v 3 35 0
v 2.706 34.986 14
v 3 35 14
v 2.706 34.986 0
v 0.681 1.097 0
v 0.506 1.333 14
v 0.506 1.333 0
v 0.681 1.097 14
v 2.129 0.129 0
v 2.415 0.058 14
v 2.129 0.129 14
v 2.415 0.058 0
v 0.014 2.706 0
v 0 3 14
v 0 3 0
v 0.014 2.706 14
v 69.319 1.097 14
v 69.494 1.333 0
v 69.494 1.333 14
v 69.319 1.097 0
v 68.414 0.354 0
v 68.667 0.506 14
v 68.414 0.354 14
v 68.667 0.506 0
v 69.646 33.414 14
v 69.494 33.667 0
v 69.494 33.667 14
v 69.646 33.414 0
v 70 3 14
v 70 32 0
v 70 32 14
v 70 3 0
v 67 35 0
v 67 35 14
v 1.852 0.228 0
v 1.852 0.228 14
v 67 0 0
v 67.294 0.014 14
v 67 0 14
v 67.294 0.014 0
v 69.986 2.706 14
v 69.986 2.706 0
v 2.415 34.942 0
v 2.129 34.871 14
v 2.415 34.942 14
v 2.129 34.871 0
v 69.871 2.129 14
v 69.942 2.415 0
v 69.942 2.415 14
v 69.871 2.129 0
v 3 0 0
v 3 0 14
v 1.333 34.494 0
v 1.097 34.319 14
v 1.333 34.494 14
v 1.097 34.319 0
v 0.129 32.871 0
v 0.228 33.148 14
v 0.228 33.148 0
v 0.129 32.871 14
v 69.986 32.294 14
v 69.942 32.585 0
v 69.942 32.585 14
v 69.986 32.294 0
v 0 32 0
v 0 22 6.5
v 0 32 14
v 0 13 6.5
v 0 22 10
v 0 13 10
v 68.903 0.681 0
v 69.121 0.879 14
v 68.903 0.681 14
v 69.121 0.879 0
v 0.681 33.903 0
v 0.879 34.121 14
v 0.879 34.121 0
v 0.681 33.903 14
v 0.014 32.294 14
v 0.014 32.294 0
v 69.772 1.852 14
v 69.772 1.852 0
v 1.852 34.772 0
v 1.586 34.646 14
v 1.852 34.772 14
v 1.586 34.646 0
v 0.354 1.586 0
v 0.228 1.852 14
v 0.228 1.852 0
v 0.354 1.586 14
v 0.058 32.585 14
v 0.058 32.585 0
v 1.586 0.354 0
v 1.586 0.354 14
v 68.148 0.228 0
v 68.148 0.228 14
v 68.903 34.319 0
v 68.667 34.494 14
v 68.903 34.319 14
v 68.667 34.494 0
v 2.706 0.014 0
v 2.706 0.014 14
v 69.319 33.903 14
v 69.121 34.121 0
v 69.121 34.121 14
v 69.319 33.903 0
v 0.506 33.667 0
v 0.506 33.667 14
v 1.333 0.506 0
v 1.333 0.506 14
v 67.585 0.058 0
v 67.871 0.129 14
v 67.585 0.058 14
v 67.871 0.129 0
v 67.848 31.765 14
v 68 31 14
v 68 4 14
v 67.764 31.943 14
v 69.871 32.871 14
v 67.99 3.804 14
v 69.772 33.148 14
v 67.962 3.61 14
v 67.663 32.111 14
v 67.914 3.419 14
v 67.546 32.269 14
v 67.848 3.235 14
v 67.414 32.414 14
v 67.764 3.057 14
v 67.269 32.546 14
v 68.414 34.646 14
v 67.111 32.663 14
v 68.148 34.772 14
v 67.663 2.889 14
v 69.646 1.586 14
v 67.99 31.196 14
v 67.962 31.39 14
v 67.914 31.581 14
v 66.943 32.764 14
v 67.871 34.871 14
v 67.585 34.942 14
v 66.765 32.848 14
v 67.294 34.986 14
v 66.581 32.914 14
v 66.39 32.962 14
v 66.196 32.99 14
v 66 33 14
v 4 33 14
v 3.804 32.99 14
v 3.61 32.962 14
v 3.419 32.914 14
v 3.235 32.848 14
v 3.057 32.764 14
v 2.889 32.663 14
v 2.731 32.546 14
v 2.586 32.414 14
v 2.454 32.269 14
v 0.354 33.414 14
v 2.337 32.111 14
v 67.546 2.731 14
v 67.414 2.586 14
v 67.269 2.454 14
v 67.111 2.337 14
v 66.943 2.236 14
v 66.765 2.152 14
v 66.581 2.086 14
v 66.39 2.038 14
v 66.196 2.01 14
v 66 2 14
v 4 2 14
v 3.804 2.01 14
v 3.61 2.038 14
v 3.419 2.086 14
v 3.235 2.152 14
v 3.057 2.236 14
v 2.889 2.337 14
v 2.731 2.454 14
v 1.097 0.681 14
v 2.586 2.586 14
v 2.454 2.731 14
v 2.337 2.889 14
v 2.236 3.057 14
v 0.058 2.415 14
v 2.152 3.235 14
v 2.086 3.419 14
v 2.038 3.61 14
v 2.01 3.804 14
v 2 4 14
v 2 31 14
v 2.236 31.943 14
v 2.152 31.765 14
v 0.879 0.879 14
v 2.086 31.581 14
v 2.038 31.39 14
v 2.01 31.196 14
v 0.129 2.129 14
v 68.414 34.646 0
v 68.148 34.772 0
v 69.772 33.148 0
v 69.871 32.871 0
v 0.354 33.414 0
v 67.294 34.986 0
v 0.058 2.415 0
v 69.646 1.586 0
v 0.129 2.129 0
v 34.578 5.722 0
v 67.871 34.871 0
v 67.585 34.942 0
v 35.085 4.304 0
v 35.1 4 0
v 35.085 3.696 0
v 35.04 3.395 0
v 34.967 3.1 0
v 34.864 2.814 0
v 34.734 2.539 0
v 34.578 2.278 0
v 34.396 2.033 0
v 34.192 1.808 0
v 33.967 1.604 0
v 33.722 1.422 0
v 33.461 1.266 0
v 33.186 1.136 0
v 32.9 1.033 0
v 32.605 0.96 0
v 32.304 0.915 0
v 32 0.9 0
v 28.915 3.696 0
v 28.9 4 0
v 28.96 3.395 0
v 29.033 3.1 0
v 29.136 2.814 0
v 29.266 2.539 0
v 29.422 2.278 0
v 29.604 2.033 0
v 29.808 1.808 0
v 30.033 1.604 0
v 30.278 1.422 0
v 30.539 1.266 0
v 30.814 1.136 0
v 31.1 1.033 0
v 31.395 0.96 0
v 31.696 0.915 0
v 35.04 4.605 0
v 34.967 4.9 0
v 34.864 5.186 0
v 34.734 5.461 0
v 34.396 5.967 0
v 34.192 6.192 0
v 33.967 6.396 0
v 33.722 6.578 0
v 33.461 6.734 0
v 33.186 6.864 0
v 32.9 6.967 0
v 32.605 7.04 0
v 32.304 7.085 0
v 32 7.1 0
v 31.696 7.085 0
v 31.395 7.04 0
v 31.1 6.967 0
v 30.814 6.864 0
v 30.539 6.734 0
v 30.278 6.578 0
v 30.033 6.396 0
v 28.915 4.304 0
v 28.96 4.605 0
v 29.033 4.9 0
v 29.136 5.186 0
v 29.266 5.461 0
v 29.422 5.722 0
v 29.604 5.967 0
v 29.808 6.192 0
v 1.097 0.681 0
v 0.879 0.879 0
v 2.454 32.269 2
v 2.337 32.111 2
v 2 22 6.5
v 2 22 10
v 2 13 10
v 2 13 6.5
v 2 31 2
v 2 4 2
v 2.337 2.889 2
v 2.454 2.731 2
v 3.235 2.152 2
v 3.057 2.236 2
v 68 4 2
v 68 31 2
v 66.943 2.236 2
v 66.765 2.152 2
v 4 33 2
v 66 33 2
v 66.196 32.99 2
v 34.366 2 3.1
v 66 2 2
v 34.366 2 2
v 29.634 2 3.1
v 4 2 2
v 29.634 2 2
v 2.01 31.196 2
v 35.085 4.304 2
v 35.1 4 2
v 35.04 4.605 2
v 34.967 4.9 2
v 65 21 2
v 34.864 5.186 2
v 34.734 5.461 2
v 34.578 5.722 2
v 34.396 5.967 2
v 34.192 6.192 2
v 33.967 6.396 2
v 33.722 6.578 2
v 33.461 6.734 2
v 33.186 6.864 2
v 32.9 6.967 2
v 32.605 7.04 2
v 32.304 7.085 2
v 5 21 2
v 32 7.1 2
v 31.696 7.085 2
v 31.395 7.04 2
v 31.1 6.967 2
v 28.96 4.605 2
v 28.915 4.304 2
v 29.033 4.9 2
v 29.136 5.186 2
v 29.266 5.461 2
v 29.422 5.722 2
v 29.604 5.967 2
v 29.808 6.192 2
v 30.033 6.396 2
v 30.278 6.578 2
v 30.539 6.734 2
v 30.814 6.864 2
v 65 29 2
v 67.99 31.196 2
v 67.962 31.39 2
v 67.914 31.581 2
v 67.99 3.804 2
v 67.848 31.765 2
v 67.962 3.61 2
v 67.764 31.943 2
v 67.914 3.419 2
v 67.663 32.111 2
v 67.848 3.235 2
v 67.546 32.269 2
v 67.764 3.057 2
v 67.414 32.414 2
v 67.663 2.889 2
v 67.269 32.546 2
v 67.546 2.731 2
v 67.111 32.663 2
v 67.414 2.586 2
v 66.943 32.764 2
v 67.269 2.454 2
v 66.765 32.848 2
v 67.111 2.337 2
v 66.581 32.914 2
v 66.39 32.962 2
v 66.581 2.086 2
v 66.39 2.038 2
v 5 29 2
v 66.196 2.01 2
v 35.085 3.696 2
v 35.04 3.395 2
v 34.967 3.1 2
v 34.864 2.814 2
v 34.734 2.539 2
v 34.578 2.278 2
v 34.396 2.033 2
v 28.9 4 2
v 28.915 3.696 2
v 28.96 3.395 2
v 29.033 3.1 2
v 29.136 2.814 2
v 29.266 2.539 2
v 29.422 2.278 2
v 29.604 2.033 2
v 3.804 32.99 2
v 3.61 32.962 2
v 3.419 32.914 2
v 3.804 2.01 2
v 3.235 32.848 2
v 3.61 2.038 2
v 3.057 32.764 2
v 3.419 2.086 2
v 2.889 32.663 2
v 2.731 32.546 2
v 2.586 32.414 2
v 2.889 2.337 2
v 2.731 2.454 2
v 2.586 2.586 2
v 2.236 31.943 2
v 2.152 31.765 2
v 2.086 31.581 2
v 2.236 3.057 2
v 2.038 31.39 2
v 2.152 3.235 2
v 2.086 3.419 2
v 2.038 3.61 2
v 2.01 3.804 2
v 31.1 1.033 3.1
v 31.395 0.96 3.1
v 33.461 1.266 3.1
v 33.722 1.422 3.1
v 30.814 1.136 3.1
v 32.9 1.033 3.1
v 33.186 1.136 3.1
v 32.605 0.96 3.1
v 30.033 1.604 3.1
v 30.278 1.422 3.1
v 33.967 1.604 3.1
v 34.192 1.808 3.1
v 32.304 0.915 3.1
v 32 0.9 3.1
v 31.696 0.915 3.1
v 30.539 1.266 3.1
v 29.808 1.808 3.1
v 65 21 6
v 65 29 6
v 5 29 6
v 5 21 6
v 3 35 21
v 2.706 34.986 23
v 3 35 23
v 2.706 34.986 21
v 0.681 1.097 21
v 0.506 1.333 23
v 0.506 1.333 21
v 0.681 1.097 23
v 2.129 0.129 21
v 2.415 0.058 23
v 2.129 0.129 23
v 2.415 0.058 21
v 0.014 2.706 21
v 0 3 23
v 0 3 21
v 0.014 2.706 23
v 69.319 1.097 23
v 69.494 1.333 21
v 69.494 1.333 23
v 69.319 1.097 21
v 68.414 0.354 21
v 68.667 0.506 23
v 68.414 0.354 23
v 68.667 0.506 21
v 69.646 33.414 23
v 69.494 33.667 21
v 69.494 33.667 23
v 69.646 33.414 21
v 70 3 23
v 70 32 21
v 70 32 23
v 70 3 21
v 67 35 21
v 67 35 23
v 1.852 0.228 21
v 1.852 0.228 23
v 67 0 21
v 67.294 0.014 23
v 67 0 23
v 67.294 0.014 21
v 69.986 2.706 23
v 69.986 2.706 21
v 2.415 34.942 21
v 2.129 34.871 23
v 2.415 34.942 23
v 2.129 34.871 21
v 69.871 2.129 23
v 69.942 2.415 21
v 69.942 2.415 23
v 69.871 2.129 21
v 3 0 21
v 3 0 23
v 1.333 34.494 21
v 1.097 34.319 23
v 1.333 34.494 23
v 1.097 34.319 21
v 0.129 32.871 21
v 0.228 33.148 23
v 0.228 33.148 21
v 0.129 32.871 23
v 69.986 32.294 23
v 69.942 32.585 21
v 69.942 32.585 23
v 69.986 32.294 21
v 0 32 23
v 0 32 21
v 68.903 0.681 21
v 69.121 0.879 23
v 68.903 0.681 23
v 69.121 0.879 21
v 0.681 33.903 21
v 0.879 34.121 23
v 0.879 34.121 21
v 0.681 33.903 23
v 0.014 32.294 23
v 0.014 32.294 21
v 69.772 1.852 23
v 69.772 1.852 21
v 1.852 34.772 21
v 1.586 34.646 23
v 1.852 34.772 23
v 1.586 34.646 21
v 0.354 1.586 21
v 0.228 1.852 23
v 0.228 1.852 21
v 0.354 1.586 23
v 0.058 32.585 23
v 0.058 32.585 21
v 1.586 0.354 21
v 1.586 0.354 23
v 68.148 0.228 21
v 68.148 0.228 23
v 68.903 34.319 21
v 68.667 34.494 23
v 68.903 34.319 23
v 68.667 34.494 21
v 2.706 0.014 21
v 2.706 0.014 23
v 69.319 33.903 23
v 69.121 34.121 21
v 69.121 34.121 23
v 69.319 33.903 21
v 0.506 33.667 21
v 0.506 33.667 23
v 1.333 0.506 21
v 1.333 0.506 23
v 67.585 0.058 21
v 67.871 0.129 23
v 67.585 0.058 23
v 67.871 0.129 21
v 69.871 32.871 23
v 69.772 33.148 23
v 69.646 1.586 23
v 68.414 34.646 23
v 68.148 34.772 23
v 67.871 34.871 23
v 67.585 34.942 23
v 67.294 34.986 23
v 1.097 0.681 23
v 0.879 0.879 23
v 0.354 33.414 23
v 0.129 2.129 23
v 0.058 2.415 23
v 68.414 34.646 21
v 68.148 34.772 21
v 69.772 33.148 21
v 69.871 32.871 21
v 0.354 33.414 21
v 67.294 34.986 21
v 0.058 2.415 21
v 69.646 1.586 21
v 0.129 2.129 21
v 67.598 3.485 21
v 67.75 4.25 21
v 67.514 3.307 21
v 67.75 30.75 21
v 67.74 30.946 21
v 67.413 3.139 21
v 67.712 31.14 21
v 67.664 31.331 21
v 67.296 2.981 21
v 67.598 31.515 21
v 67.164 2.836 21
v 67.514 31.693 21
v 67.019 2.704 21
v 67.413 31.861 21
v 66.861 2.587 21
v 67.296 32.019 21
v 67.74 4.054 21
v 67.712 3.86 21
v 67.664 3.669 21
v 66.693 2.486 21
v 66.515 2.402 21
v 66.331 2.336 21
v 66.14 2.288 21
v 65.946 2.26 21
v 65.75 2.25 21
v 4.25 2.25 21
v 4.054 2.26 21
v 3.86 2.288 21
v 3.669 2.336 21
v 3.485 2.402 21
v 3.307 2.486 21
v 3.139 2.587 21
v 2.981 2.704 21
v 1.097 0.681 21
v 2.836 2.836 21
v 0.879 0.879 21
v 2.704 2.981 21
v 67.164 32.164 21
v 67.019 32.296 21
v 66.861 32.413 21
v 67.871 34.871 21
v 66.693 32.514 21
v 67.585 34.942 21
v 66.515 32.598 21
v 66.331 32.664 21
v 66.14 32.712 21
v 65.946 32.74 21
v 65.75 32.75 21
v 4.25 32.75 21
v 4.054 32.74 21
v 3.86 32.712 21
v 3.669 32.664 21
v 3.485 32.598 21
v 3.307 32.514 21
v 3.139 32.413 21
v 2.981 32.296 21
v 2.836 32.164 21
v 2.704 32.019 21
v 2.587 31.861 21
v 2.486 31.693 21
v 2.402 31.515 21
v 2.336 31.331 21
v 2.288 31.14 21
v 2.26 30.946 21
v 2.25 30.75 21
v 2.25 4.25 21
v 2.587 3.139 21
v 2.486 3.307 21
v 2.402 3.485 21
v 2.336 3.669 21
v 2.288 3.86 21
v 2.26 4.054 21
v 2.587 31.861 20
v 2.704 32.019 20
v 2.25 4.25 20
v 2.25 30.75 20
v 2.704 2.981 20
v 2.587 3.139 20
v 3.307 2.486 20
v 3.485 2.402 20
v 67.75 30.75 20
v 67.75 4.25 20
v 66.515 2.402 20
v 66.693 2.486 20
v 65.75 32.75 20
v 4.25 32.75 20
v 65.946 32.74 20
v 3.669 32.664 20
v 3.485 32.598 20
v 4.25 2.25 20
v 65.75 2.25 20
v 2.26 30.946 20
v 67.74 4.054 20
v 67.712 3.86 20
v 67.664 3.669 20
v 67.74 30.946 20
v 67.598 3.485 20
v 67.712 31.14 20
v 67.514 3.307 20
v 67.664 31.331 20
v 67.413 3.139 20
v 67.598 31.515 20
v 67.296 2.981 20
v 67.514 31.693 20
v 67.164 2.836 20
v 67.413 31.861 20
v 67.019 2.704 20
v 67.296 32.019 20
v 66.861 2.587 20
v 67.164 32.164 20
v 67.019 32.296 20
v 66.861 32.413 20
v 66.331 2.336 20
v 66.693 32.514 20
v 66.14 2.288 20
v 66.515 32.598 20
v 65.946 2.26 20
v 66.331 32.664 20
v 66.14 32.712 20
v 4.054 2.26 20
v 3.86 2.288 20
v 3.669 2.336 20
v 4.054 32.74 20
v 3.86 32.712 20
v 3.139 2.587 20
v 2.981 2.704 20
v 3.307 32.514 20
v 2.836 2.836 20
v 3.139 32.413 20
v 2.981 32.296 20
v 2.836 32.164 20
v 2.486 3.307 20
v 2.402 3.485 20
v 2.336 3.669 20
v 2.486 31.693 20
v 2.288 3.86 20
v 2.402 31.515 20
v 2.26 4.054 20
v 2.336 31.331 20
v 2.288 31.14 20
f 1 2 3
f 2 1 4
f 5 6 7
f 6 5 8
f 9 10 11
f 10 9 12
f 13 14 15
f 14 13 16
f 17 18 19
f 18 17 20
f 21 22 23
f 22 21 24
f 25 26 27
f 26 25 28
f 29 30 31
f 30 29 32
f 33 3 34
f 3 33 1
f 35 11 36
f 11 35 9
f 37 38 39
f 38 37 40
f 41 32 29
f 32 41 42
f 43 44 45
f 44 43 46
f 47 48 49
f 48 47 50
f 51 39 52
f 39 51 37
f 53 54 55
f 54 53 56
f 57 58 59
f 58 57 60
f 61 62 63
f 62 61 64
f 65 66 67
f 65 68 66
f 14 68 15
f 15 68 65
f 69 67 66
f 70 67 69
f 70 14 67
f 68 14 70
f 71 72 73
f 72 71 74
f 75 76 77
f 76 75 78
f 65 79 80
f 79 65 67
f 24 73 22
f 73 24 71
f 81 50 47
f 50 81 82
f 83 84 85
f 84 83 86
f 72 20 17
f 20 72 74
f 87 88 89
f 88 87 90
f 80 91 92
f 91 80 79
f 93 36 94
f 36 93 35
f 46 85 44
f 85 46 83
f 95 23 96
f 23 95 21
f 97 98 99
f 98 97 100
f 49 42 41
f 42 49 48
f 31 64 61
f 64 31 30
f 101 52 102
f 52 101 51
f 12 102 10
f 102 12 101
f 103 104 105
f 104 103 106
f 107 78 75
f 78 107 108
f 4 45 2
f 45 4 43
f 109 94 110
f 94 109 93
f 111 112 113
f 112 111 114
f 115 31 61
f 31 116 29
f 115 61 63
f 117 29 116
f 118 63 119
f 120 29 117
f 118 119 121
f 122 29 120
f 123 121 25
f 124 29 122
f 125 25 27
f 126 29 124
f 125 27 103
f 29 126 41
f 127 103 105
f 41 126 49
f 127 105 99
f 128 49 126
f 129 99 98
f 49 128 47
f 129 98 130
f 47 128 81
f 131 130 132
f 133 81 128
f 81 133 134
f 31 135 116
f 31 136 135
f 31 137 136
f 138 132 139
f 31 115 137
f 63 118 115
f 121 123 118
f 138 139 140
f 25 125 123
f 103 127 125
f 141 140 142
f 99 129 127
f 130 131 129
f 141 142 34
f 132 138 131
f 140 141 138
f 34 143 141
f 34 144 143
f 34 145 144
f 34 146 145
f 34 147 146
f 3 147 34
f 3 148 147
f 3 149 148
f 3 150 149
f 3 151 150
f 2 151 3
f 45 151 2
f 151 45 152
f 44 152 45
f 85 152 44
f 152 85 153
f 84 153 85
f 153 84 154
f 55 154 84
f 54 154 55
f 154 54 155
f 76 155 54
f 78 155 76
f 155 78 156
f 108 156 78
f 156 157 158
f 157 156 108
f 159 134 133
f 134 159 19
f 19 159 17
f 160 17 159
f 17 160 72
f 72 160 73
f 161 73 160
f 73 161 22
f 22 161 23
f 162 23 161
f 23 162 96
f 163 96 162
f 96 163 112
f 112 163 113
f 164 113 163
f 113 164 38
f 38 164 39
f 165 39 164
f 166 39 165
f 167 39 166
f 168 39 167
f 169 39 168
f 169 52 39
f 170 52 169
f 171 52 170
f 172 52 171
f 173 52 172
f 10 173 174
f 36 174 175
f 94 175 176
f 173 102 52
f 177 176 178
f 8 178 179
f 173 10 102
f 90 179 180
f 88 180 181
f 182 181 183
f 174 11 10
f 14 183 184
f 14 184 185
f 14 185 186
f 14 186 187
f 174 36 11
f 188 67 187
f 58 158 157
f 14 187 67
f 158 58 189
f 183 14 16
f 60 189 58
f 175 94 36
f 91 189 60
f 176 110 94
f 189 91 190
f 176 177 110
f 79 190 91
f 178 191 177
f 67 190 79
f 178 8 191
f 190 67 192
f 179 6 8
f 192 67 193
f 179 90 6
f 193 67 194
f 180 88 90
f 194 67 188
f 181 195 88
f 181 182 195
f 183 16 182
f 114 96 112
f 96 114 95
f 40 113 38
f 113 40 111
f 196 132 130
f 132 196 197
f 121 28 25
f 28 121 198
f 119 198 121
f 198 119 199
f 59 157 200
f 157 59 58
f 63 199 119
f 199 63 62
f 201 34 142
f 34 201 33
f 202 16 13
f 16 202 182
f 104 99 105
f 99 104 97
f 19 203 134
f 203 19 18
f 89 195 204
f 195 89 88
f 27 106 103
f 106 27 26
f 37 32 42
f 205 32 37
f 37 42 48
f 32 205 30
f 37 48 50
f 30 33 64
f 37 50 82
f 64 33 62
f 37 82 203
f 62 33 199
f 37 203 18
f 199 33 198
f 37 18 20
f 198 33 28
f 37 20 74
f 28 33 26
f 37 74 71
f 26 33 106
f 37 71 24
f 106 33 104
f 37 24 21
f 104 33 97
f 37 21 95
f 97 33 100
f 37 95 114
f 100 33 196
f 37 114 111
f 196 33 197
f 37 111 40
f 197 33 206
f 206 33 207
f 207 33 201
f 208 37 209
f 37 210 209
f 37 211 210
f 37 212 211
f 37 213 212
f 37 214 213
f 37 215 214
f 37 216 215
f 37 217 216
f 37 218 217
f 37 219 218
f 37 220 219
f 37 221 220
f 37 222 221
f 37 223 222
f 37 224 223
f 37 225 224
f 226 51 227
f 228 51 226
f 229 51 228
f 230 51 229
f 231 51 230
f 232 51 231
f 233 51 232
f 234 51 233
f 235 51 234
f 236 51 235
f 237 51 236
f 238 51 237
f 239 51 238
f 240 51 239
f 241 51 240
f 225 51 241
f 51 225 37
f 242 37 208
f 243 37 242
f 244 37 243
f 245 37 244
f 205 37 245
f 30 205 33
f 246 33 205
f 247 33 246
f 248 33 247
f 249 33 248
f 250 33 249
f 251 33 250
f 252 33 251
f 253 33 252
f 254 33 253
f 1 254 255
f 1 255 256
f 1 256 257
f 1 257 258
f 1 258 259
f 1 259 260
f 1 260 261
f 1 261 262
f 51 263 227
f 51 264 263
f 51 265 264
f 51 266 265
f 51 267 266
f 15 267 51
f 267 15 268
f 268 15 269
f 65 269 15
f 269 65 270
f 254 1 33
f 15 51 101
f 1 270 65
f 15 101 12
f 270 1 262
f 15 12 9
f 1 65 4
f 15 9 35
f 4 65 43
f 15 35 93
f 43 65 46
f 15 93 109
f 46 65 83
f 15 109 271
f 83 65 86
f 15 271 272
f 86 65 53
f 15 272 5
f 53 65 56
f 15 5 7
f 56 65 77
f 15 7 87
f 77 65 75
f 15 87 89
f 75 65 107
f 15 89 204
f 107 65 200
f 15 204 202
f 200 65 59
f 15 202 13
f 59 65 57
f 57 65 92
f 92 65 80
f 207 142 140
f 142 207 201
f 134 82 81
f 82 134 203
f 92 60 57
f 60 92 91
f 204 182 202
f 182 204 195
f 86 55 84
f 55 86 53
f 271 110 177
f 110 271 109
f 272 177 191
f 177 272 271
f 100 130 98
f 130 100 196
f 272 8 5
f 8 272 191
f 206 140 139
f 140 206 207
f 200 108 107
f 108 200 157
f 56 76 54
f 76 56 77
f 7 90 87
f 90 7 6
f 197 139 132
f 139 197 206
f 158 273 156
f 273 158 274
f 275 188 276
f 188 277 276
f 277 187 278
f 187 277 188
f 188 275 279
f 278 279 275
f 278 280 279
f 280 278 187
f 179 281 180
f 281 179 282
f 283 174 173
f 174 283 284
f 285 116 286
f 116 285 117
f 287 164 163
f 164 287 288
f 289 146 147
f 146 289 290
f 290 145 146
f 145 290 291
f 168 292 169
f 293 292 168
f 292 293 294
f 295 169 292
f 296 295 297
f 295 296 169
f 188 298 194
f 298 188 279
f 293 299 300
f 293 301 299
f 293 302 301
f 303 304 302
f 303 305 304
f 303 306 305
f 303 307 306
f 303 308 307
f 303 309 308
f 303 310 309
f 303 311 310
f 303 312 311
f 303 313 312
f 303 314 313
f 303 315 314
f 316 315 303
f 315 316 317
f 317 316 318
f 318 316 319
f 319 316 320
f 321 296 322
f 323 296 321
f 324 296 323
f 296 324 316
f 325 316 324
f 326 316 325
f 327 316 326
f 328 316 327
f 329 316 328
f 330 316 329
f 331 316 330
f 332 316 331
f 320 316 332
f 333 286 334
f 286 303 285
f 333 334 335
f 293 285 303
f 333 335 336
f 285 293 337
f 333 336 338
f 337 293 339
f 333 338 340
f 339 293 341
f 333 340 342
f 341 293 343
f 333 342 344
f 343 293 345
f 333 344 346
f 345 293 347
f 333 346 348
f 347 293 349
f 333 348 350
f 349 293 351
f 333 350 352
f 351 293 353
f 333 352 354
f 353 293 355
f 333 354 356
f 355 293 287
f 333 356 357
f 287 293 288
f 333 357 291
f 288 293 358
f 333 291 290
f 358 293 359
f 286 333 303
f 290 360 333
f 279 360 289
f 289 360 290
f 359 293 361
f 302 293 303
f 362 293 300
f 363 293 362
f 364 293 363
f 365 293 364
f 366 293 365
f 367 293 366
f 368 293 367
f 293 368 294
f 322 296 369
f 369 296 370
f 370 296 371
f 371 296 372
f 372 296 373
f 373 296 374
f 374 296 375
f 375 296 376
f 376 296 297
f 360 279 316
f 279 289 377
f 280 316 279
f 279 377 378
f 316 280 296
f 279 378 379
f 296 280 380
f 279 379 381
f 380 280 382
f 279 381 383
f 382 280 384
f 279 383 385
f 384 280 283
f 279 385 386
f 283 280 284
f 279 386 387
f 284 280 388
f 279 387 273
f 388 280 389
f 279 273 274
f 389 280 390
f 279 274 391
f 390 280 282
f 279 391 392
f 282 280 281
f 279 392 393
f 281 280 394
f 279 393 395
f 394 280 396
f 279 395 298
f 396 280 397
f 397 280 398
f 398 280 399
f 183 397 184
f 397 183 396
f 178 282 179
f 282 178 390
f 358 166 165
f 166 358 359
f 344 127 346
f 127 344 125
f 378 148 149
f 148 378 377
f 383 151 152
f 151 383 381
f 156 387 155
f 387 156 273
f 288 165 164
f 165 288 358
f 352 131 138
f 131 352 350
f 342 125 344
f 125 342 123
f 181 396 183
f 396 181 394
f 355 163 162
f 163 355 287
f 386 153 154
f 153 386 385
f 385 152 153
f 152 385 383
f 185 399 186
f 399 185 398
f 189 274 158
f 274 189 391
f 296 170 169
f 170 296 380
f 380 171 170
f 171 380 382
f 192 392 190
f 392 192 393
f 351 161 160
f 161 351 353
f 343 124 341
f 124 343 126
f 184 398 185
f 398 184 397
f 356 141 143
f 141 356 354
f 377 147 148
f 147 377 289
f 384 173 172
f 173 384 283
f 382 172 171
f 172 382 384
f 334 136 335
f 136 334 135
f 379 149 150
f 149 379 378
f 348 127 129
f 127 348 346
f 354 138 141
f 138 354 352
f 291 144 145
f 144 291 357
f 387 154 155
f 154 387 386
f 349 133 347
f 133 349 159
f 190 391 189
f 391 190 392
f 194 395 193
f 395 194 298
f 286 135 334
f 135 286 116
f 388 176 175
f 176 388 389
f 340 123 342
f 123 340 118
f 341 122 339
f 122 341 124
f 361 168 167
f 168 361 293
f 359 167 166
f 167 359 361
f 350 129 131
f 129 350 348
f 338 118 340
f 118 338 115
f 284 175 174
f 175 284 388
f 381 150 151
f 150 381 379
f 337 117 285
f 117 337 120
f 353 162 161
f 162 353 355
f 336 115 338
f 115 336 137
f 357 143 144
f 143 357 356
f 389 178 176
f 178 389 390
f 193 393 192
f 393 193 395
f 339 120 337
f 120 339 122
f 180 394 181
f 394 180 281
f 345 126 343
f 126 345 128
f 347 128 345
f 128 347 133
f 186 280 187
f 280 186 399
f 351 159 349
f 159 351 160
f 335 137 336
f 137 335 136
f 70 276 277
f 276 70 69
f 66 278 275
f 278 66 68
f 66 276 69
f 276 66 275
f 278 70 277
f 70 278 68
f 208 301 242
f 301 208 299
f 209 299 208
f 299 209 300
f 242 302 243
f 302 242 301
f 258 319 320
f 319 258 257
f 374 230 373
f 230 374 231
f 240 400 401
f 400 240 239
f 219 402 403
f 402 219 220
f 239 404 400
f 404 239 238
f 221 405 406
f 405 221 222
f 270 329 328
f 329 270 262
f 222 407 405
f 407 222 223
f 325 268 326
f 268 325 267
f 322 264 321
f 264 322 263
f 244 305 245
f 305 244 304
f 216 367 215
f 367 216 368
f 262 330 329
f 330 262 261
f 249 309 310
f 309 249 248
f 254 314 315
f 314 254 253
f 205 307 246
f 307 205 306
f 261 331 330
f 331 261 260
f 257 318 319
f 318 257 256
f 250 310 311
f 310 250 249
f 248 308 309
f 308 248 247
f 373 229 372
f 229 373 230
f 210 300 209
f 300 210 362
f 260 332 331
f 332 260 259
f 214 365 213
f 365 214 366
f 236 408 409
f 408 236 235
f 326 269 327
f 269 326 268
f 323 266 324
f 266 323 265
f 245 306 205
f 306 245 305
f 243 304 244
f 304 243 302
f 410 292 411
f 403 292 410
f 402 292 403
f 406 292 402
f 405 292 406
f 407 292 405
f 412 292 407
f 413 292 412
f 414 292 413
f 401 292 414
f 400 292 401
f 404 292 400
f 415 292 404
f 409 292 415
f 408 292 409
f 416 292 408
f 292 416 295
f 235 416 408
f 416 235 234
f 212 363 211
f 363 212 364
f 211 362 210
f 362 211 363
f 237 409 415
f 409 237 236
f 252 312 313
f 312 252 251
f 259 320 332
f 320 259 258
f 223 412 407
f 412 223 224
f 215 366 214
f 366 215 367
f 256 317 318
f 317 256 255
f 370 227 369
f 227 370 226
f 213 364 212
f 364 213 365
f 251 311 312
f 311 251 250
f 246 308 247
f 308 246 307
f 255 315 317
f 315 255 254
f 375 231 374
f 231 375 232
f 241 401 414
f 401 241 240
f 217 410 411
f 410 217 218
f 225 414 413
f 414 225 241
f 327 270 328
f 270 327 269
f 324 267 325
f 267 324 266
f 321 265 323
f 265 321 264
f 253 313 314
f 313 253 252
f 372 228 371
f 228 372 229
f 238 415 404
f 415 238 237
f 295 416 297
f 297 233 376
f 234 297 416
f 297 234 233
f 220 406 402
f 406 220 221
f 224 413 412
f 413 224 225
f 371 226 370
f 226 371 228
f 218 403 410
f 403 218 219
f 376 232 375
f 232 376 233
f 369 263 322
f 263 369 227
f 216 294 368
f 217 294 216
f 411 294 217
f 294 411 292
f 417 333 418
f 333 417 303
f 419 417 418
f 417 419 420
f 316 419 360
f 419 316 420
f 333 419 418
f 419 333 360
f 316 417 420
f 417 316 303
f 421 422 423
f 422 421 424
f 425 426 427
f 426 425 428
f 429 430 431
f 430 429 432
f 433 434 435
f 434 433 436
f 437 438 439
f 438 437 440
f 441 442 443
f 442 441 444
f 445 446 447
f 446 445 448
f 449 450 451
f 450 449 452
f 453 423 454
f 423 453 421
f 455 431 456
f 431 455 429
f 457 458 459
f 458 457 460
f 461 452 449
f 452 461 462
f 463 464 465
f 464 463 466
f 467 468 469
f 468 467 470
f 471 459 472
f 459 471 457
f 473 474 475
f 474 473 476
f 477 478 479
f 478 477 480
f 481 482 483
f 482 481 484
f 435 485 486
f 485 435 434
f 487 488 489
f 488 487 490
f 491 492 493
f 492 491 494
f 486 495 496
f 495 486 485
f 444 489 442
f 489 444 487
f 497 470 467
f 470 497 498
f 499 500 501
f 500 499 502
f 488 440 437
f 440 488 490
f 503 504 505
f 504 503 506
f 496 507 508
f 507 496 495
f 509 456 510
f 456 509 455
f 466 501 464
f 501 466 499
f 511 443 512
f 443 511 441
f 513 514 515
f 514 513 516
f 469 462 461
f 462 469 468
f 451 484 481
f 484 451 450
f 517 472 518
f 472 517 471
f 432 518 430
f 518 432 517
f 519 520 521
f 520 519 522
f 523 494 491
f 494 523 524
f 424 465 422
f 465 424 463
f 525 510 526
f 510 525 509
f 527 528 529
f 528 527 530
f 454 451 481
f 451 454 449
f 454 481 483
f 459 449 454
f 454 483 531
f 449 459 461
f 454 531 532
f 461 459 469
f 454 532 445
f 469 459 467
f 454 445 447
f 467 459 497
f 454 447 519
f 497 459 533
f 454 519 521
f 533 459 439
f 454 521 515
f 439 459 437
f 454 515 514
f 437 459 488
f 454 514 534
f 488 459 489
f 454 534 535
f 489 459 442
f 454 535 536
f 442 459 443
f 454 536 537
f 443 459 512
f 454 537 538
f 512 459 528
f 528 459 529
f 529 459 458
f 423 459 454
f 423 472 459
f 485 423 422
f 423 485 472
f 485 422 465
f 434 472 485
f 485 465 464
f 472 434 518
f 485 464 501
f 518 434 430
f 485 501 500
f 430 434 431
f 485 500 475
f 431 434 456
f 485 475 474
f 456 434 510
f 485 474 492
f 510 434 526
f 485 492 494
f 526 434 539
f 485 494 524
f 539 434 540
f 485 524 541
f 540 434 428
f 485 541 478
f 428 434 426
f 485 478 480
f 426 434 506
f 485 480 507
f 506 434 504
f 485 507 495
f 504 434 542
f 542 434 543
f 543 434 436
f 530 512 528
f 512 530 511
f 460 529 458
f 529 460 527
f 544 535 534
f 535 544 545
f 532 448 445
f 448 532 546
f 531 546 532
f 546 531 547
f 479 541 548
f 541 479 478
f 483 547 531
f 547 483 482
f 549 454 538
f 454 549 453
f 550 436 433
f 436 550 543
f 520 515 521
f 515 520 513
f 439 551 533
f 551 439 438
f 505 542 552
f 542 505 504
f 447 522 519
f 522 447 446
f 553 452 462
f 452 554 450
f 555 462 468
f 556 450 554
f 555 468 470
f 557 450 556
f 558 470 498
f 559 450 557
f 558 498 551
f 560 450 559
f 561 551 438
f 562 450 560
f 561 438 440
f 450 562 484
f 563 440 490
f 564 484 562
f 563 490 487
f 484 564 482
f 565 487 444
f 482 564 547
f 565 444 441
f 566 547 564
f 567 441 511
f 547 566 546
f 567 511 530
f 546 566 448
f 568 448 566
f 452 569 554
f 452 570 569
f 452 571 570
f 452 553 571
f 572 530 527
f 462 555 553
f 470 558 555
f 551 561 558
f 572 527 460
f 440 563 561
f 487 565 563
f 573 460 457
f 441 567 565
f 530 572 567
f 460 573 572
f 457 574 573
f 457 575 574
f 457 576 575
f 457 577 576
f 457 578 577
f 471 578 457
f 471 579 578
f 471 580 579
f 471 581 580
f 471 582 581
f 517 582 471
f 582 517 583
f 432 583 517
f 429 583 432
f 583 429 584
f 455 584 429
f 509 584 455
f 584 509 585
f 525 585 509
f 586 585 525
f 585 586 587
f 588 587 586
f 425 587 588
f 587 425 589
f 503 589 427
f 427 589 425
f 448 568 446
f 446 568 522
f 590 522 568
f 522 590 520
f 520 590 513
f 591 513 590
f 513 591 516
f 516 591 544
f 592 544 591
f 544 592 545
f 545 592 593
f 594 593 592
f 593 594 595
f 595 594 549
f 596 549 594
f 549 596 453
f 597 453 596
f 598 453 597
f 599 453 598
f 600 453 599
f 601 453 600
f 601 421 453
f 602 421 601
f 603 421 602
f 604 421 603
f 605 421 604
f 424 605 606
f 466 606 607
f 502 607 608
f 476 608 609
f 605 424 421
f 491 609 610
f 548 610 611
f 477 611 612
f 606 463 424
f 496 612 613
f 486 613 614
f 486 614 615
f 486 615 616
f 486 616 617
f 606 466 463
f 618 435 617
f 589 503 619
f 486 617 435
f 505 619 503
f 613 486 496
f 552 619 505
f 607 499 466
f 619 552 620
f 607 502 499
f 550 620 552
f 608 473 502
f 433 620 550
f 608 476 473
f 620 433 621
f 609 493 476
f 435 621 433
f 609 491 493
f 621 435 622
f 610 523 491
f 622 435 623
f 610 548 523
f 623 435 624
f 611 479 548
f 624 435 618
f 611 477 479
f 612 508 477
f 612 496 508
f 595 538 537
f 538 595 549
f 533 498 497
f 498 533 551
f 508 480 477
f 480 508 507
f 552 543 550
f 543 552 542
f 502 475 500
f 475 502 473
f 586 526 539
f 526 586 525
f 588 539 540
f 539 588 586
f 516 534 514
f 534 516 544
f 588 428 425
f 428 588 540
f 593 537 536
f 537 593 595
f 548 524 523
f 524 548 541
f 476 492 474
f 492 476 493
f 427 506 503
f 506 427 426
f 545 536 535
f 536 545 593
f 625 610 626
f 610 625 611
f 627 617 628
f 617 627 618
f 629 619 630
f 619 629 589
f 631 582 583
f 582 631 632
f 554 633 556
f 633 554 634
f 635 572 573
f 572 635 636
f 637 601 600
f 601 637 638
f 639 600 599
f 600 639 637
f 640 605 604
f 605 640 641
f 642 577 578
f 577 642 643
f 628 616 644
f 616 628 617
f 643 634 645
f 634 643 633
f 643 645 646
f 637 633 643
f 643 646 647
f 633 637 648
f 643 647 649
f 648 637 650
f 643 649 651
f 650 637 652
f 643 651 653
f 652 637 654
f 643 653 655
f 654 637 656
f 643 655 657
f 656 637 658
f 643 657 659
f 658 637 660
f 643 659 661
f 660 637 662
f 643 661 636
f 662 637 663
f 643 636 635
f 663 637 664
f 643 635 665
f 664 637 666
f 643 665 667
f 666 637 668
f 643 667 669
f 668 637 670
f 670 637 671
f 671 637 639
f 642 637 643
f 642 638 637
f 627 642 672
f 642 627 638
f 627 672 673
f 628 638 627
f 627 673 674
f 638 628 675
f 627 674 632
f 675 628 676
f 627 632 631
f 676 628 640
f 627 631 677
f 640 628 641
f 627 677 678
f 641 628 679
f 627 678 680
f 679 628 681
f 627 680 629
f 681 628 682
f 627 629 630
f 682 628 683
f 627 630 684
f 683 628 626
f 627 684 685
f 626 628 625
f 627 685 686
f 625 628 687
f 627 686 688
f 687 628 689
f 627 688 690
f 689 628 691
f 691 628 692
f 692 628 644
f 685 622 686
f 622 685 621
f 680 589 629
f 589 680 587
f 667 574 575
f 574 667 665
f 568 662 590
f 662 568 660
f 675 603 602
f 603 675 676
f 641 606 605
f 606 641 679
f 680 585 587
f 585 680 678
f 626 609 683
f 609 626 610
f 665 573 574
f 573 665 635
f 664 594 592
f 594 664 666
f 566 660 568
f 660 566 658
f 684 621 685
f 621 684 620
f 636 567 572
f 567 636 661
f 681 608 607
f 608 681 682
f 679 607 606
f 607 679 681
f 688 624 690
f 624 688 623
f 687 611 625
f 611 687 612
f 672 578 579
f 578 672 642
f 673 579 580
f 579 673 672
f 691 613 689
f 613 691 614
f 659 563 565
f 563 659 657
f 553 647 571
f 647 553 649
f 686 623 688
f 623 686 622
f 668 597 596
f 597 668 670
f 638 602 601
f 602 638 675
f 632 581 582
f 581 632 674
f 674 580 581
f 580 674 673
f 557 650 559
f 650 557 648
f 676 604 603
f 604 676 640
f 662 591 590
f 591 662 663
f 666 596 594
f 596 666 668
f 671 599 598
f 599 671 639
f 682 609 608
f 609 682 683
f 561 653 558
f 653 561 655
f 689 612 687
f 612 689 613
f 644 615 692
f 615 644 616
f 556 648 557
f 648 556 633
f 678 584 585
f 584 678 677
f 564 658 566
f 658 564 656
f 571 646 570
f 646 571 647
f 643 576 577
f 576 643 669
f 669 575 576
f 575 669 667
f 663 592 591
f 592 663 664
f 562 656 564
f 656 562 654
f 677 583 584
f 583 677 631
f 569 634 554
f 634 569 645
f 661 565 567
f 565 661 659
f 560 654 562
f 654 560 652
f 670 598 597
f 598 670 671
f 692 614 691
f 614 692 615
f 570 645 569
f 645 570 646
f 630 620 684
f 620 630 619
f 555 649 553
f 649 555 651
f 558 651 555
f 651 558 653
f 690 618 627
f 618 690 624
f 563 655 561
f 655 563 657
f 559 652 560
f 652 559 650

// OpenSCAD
// HazardLink — sign tag enclosure (UWB precision finding)
//
// Embeds in the handle of a wet-floor sign. Holds a Qorvo DWM3001CDK
// dev board, a 500mAh LiPo cell, and a 6×3 mm neodymium magnet that
// triggers the hanger's Hall sensor.
//
// Designed for IP67 potting — drop the assembled tag into the
// enclosure, fill with two-part epoxy, snap the lid on.
//
// Print in PETG for prototype; production version should be
// injection-moulded ABS for ruggedness in a wet environment.

$fn = 64;
WALL = 2;
TOL  = 0.25;

// External dimensions — fits the dev kit; production PCB will shrink
// these substantially (target 50 × 25 × 12 mm).
W = 70;
H = 35;
D = 16;

PART = "both";  // "body", "lid", "both"

if (PART == "body" || PART == "both") body();
if (PART == "lid"  || PART == "both") translate([0, 0, D + 5]) lid();

module body() {
    difference() {
        rounded_box(W, H, D - WALL, r = 3);
        translate([WALL, WALL, WALL])
            rounded_box(W - 2*WALL, H - 2*WALL, D, r = 2);
        // USB-C cutout for charging
        translate([-1, H/2 - 4.5, D/2 - 1.5])
            cube([WALL + 2, 9, 3.5]);
        // LED light pipe (charging indicator visible through enclosure)
        translate([W - 8, H/2, D - WALL - 0.5])
            cylinder(d = 2, h = WALL + 1);
        // Magnet recess at the bottom (6×3 mm magnet press-fits in)
        translate([W/2 - 3, 4, -0.1])
            cylinder(d = 6.2, h = 3.2);
    }
    // Battery cradle
    translate([5, H - 14, WALL])
        cube([60, 8, 4]);
}

module lid() {
    rounded_box(W, H, WALL, r = 3);
    translate([WALL + TOL, WALL + TOL, -1])
        rounded_box(W - 2*(WALL + TOL), H - 2*(WALL + TOL), 1, r = 2);
}

module rounded_box(w, h, d, r) {
    hull() for (x = [r, w-r]) for (y = [r, h-r])
        translate([x, y, 0]) cylinder(r = r, h = d);
}
